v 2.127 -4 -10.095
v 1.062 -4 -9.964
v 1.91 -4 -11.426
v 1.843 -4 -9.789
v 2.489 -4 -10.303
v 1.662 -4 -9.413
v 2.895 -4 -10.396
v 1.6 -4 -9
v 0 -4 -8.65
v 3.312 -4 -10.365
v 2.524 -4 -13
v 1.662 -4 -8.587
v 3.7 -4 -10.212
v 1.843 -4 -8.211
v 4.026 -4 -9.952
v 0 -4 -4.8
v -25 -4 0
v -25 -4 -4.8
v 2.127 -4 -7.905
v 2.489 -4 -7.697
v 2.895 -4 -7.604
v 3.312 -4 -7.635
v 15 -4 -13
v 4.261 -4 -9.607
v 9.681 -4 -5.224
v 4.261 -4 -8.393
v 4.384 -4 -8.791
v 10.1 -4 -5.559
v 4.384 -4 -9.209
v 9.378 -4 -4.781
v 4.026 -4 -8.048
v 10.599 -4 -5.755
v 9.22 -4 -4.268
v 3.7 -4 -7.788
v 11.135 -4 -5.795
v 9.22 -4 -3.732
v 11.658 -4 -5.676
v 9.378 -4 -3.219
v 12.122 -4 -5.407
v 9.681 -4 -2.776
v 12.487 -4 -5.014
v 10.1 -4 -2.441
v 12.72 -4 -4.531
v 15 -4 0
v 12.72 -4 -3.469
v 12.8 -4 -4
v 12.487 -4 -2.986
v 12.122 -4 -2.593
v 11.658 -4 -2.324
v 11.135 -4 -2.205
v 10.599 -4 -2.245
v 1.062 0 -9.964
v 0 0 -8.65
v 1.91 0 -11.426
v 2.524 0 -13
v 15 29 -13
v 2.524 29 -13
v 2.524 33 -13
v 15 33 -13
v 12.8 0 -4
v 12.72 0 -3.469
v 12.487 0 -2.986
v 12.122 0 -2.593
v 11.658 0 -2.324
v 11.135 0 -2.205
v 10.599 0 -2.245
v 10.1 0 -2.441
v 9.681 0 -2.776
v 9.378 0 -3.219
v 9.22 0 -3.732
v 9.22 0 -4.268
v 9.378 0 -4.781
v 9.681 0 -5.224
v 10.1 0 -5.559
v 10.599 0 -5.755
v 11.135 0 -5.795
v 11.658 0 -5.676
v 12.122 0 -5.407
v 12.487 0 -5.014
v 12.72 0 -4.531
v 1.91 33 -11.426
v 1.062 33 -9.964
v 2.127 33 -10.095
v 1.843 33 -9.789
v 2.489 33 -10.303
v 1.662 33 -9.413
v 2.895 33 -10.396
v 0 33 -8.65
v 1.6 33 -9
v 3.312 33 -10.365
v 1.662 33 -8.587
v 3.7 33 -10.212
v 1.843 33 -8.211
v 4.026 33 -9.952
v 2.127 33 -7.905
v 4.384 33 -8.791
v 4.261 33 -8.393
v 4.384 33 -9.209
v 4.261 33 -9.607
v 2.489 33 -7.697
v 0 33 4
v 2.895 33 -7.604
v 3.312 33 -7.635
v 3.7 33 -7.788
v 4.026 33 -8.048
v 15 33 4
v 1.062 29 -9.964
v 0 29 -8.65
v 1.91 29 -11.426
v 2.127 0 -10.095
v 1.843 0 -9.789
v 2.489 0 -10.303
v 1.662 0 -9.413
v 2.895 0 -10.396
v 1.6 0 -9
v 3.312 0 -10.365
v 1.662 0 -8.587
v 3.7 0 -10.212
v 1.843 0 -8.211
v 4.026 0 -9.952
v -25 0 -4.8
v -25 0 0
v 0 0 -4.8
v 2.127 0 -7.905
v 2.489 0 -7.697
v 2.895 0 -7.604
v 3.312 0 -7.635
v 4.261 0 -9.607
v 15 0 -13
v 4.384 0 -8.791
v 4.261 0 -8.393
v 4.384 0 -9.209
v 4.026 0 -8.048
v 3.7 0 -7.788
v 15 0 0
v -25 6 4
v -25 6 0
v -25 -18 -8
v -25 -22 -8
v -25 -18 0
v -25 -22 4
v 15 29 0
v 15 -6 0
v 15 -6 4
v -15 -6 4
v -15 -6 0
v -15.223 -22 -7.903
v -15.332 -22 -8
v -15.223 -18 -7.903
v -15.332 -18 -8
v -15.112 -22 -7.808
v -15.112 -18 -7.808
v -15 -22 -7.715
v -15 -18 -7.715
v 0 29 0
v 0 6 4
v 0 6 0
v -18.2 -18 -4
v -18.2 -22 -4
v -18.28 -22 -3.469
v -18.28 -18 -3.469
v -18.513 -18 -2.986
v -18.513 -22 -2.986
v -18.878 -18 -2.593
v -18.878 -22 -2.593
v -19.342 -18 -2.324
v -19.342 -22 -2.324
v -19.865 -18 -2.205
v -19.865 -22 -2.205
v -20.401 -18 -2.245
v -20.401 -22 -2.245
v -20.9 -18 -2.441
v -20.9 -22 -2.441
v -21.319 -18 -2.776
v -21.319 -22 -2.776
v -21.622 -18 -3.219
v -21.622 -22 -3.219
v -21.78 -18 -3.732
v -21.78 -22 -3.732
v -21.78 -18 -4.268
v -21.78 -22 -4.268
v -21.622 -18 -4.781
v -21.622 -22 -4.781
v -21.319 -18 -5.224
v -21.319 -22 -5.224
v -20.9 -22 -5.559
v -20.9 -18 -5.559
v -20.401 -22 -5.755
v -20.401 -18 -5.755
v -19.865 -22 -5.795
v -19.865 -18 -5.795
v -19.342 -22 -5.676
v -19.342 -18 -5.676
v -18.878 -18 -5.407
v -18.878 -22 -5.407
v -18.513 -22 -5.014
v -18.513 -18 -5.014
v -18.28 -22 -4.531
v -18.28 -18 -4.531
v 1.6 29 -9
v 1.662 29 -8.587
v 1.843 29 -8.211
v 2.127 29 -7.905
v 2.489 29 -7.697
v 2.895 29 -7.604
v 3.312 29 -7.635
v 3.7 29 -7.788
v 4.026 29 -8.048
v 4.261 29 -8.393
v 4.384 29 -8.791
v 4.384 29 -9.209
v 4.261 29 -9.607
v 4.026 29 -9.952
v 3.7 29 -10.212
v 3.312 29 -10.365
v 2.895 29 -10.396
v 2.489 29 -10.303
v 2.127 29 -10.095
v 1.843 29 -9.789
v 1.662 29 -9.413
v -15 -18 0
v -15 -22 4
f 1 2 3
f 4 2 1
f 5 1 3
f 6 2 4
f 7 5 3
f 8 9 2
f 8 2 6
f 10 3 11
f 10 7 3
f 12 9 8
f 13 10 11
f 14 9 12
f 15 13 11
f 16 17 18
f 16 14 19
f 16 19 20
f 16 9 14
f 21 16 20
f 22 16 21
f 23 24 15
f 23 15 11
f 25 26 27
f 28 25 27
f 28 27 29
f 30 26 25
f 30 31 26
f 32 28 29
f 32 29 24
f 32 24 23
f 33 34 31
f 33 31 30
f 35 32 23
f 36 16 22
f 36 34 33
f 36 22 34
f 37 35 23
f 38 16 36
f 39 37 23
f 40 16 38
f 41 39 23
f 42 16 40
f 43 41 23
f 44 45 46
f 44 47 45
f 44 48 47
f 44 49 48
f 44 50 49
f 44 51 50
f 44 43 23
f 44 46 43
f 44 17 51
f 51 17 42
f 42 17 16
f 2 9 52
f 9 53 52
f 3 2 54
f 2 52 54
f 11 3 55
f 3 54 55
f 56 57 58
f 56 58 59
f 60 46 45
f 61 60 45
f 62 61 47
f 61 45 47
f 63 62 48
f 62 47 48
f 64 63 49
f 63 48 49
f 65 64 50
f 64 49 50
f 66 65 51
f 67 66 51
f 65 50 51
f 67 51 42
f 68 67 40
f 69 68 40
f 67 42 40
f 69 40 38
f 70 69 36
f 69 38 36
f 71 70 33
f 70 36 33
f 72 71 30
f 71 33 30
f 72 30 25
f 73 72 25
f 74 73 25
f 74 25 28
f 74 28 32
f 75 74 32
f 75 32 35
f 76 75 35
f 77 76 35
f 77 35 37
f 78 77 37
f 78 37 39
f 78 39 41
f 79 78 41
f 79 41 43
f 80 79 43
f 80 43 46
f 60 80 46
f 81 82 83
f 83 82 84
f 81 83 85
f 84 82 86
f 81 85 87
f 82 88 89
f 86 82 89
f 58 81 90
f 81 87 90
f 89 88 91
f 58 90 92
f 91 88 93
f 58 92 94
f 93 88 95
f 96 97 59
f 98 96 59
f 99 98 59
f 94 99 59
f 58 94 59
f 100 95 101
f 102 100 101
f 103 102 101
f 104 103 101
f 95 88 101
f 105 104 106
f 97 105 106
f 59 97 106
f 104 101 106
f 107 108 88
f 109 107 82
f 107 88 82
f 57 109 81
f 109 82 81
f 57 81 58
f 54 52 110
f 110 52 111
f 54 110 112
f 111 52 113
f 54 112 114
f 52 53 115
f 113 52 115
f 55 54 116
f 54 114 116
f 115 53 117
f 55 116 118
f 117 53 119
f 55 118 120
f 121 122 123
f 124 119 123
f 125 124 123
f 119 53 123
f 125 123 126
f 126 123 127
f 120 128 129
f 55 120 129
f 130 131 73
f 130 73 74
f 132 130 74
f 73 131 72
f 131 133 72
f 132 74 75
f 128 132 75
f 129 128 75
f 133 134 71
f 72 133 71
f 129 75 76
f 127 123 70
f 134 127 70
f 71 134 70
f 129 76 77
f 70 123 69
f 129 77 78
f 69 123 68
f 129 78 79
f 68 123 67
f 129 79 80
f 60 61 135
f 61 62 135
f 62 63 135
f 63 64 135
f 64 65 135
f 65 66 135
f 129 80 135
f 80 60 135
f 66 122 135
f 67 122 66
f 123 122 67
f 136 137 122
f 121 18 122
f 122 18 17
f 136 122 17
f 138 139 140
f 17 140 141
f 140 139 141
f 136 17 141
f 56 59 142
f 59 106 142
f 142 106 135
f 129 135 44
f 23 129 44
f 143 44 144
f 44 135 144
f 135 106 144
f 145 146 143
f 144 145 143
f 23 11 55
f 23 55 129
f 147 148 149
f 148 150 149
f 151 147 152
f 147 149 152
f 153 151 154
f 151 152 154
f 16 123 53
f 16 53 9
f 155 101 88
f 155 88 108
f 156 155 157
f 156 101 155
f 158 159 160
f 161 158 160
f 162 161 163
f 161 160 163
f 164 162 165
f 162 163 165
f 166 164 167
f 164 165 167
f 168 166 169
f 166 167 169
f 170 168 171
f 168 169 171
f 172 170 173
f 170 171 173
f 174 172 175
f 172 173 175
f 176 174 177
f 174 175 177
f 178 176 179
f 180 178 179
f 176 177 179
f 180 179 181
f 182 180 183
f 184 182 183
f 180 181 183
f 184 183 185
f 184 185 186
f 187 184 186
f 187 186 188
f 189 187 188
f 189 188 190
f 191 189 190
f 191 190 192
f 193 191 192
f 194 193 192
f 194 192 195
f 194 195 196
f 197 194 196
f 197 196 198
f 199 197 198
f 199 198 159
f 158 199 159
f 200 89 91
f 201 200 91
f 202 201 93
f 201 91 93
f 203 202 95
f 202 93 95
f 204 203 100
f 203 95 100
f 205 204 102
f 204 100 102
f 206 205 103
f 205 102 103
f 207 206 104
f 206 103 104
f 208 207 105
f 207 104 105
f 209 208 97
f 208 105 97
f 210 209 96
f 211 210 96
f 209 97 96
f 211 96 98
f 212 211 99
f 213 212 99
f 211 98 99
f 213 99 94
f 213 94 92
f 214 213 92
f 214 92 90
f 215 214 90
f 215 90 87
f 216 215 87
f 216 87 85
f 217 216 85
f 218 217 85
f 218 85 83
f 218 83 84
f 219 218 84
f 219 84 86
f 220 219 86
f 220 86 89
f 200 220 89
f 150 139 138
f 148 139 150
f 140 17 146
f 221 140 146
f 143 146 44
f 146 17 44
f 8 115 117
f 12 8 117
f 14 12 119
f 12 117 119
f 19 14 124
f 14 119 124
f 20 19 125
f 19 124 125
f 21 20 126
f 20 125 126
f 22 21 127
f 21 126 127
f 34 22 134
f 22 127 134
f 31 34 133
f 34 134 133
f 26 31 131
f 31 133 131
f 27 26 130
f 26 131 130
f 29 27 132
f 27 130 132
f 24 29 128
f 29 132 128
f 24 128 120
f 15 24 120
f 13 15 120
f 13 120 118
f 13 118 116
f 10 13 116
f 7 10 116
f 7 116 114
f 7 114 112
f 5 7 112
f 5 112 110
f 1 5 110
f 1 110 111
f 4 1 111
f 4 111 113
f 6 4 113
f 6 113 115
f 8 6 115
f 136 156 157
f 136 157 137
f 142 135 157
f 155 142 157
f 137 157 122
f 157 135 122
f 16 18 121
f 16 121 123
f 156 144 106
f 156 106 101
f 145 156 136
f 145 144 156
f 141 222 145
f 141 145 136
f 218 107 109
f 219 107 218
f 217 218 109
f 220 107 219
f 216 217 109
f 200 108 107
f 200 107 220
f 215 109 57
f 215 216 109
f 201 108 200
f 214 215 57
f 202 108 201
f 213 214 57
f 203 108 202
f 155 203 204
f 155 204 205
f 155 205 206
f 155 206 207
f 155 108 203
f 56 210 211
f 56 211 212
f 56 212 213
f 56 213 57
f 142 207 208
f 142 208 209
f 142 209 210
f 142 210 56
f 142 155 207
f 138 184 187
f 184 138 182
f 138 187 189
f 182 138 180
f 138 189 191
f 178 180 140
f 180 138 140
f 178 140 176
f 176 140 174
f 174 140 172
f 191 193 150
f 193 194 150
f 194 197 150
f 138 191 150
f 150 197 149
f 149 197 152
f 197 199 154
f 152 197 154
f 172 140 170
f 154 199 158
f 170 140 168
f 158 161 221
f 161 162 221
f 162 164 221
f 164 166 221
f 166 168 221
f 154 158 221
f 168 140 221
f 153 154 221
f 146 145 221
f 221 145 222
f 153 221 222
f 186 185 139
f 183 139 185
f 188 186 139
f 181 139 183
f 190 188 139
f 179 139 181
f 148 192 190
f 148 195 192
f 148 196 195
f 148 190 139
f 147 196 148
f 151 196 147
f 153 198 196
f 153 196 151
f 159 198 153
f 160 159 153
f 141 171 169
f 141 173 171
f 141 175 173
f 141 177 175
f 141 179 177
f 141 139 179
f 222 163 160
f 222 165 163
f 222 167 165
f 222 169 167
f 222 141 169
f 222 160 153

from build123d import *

# Parameters (mm, degrees)
PAD_DEPTH       = 4
SKETCH001_W     = 25
SKETCH001_H     = 4
PAD001_DEPTH    = 4.8
SKETCH002_W     = 15
SKETCH002_H     = 4
PAD002_DEPTH    = 13
SKETCH003_W     = 10
SKETCH003_H     = 4
PAD003_DEPTH    = 8
SKETCH004_R     = 1.4
SKETCH004_R_2   = 11
POCKET_DEPTH    = 100
SKETCH005_R     = 1.8
POCKET001_DEPTH = 5
SKETCH007_R     = 1.8
POCKET002_DEPTH = 5
SKETCH008_W     = 25
SKETCH008_H     = 4
PAD004_DEPTH    = 6


with BuildPart() as part:
    # Sketch → Pad (new body)
    with BuildSketch(Plane.XY):
        Polygon((0, 33), (0, 0), (-25, 0), (-25, -22), (-15, -22), (-15, -6), (15, -6), (15, 33), align=None)
    extrude(amount=PAD_DEPTH)

    # Sketch001 (on Face9 of Pad) → Pad001 (join)
    with BuildSketch(Plane(origin=(0, 0, 0), x_dir=(1, 0, 0), z_dir=(0, 0, -1))):
        with Locations((-12.5, 2)):
            Rectangle(SKETCH001_W, SKETCH001_H)
    extrude(amount=PAD001_DEPTH)

    # Sketch002 (on Face4 of Pad001) → Pad002 (join)
    with BuildSketch(Plane(origin=(0, 0, 0), x_dir=(1, 0, 0), z_dir=(0, 0, -1))):
        with Locations((7.5, -31)):
            Rectangle(SKETCH002_W, SKETCH002_H)
        with Locations((7.5, 2)):
            Rectangle(SKETCH002_W, SKETCH002_H)
    extrude(amount=PAD002_DEPTH)

    # Sketch003 (on Face4 of Pad002) → Pad003 (join)
    with BuildSketch(Plane(origin=(0, 0, 0), x_dir=(1, 0, 0), z_dir=(0, 0, -1))):
        with Locations((-20, 20)):
            Rectangle(SKETCH003_W, SKETCH003_H)
    extrude(amount=PAD003_DEPTH)

    # Sketch004 (on Face20 of Pad003) → Pocket (cut)
    with BuildSketch(Plane(origin=(0, 33, 0), x_dir=(-1, 0, 0), z_dir=(0, 1, 0))):
        with Locations((-3, -9)):
            Circle(SKETCH004_R)
        with Locations((8, -16.2)):
            Circle(SKETCH004_R_2)
    extrude(amount=-POCKET_DEPTH, mode=Mode.SUBTRACT)

    # Sketch005 (on Face18 of Pocket) → Pocket001 (cut)
    with BuildSketch(Plane.XZ.offset(22)):
        with Locations((-20, -4)):
            Circle(SKETCH005_R)
    extrude(amount=-POCKET001_DEPTH, mode=Mode.SUBTRACT)

    # Sketch007 (on Face15 of Pocket001) → Pocket002 (cut)
    with BuildSketch(Plane.XZ.offset(4)):
        with Locations((11, -4)):
            Circle(SKETCH007_R)
    extrude(amount=-POCKET002_DEPTH, mode=Mode.SUBTRACT)

    # Sketch008 (on Face17 of Pocket002) → Pad004 (join)
    with BuildSketch(Plane(origin=(0, 0, 0), x_dir=(-1, 0, 0), z_dir=(0, 1, 0))):
        with Locations((12.5, 2)):
            Rectangle(SKETCH008_W, SKETCH008_H)
    extrude(amount=PAD004_DEPTH)


solid = part.part
